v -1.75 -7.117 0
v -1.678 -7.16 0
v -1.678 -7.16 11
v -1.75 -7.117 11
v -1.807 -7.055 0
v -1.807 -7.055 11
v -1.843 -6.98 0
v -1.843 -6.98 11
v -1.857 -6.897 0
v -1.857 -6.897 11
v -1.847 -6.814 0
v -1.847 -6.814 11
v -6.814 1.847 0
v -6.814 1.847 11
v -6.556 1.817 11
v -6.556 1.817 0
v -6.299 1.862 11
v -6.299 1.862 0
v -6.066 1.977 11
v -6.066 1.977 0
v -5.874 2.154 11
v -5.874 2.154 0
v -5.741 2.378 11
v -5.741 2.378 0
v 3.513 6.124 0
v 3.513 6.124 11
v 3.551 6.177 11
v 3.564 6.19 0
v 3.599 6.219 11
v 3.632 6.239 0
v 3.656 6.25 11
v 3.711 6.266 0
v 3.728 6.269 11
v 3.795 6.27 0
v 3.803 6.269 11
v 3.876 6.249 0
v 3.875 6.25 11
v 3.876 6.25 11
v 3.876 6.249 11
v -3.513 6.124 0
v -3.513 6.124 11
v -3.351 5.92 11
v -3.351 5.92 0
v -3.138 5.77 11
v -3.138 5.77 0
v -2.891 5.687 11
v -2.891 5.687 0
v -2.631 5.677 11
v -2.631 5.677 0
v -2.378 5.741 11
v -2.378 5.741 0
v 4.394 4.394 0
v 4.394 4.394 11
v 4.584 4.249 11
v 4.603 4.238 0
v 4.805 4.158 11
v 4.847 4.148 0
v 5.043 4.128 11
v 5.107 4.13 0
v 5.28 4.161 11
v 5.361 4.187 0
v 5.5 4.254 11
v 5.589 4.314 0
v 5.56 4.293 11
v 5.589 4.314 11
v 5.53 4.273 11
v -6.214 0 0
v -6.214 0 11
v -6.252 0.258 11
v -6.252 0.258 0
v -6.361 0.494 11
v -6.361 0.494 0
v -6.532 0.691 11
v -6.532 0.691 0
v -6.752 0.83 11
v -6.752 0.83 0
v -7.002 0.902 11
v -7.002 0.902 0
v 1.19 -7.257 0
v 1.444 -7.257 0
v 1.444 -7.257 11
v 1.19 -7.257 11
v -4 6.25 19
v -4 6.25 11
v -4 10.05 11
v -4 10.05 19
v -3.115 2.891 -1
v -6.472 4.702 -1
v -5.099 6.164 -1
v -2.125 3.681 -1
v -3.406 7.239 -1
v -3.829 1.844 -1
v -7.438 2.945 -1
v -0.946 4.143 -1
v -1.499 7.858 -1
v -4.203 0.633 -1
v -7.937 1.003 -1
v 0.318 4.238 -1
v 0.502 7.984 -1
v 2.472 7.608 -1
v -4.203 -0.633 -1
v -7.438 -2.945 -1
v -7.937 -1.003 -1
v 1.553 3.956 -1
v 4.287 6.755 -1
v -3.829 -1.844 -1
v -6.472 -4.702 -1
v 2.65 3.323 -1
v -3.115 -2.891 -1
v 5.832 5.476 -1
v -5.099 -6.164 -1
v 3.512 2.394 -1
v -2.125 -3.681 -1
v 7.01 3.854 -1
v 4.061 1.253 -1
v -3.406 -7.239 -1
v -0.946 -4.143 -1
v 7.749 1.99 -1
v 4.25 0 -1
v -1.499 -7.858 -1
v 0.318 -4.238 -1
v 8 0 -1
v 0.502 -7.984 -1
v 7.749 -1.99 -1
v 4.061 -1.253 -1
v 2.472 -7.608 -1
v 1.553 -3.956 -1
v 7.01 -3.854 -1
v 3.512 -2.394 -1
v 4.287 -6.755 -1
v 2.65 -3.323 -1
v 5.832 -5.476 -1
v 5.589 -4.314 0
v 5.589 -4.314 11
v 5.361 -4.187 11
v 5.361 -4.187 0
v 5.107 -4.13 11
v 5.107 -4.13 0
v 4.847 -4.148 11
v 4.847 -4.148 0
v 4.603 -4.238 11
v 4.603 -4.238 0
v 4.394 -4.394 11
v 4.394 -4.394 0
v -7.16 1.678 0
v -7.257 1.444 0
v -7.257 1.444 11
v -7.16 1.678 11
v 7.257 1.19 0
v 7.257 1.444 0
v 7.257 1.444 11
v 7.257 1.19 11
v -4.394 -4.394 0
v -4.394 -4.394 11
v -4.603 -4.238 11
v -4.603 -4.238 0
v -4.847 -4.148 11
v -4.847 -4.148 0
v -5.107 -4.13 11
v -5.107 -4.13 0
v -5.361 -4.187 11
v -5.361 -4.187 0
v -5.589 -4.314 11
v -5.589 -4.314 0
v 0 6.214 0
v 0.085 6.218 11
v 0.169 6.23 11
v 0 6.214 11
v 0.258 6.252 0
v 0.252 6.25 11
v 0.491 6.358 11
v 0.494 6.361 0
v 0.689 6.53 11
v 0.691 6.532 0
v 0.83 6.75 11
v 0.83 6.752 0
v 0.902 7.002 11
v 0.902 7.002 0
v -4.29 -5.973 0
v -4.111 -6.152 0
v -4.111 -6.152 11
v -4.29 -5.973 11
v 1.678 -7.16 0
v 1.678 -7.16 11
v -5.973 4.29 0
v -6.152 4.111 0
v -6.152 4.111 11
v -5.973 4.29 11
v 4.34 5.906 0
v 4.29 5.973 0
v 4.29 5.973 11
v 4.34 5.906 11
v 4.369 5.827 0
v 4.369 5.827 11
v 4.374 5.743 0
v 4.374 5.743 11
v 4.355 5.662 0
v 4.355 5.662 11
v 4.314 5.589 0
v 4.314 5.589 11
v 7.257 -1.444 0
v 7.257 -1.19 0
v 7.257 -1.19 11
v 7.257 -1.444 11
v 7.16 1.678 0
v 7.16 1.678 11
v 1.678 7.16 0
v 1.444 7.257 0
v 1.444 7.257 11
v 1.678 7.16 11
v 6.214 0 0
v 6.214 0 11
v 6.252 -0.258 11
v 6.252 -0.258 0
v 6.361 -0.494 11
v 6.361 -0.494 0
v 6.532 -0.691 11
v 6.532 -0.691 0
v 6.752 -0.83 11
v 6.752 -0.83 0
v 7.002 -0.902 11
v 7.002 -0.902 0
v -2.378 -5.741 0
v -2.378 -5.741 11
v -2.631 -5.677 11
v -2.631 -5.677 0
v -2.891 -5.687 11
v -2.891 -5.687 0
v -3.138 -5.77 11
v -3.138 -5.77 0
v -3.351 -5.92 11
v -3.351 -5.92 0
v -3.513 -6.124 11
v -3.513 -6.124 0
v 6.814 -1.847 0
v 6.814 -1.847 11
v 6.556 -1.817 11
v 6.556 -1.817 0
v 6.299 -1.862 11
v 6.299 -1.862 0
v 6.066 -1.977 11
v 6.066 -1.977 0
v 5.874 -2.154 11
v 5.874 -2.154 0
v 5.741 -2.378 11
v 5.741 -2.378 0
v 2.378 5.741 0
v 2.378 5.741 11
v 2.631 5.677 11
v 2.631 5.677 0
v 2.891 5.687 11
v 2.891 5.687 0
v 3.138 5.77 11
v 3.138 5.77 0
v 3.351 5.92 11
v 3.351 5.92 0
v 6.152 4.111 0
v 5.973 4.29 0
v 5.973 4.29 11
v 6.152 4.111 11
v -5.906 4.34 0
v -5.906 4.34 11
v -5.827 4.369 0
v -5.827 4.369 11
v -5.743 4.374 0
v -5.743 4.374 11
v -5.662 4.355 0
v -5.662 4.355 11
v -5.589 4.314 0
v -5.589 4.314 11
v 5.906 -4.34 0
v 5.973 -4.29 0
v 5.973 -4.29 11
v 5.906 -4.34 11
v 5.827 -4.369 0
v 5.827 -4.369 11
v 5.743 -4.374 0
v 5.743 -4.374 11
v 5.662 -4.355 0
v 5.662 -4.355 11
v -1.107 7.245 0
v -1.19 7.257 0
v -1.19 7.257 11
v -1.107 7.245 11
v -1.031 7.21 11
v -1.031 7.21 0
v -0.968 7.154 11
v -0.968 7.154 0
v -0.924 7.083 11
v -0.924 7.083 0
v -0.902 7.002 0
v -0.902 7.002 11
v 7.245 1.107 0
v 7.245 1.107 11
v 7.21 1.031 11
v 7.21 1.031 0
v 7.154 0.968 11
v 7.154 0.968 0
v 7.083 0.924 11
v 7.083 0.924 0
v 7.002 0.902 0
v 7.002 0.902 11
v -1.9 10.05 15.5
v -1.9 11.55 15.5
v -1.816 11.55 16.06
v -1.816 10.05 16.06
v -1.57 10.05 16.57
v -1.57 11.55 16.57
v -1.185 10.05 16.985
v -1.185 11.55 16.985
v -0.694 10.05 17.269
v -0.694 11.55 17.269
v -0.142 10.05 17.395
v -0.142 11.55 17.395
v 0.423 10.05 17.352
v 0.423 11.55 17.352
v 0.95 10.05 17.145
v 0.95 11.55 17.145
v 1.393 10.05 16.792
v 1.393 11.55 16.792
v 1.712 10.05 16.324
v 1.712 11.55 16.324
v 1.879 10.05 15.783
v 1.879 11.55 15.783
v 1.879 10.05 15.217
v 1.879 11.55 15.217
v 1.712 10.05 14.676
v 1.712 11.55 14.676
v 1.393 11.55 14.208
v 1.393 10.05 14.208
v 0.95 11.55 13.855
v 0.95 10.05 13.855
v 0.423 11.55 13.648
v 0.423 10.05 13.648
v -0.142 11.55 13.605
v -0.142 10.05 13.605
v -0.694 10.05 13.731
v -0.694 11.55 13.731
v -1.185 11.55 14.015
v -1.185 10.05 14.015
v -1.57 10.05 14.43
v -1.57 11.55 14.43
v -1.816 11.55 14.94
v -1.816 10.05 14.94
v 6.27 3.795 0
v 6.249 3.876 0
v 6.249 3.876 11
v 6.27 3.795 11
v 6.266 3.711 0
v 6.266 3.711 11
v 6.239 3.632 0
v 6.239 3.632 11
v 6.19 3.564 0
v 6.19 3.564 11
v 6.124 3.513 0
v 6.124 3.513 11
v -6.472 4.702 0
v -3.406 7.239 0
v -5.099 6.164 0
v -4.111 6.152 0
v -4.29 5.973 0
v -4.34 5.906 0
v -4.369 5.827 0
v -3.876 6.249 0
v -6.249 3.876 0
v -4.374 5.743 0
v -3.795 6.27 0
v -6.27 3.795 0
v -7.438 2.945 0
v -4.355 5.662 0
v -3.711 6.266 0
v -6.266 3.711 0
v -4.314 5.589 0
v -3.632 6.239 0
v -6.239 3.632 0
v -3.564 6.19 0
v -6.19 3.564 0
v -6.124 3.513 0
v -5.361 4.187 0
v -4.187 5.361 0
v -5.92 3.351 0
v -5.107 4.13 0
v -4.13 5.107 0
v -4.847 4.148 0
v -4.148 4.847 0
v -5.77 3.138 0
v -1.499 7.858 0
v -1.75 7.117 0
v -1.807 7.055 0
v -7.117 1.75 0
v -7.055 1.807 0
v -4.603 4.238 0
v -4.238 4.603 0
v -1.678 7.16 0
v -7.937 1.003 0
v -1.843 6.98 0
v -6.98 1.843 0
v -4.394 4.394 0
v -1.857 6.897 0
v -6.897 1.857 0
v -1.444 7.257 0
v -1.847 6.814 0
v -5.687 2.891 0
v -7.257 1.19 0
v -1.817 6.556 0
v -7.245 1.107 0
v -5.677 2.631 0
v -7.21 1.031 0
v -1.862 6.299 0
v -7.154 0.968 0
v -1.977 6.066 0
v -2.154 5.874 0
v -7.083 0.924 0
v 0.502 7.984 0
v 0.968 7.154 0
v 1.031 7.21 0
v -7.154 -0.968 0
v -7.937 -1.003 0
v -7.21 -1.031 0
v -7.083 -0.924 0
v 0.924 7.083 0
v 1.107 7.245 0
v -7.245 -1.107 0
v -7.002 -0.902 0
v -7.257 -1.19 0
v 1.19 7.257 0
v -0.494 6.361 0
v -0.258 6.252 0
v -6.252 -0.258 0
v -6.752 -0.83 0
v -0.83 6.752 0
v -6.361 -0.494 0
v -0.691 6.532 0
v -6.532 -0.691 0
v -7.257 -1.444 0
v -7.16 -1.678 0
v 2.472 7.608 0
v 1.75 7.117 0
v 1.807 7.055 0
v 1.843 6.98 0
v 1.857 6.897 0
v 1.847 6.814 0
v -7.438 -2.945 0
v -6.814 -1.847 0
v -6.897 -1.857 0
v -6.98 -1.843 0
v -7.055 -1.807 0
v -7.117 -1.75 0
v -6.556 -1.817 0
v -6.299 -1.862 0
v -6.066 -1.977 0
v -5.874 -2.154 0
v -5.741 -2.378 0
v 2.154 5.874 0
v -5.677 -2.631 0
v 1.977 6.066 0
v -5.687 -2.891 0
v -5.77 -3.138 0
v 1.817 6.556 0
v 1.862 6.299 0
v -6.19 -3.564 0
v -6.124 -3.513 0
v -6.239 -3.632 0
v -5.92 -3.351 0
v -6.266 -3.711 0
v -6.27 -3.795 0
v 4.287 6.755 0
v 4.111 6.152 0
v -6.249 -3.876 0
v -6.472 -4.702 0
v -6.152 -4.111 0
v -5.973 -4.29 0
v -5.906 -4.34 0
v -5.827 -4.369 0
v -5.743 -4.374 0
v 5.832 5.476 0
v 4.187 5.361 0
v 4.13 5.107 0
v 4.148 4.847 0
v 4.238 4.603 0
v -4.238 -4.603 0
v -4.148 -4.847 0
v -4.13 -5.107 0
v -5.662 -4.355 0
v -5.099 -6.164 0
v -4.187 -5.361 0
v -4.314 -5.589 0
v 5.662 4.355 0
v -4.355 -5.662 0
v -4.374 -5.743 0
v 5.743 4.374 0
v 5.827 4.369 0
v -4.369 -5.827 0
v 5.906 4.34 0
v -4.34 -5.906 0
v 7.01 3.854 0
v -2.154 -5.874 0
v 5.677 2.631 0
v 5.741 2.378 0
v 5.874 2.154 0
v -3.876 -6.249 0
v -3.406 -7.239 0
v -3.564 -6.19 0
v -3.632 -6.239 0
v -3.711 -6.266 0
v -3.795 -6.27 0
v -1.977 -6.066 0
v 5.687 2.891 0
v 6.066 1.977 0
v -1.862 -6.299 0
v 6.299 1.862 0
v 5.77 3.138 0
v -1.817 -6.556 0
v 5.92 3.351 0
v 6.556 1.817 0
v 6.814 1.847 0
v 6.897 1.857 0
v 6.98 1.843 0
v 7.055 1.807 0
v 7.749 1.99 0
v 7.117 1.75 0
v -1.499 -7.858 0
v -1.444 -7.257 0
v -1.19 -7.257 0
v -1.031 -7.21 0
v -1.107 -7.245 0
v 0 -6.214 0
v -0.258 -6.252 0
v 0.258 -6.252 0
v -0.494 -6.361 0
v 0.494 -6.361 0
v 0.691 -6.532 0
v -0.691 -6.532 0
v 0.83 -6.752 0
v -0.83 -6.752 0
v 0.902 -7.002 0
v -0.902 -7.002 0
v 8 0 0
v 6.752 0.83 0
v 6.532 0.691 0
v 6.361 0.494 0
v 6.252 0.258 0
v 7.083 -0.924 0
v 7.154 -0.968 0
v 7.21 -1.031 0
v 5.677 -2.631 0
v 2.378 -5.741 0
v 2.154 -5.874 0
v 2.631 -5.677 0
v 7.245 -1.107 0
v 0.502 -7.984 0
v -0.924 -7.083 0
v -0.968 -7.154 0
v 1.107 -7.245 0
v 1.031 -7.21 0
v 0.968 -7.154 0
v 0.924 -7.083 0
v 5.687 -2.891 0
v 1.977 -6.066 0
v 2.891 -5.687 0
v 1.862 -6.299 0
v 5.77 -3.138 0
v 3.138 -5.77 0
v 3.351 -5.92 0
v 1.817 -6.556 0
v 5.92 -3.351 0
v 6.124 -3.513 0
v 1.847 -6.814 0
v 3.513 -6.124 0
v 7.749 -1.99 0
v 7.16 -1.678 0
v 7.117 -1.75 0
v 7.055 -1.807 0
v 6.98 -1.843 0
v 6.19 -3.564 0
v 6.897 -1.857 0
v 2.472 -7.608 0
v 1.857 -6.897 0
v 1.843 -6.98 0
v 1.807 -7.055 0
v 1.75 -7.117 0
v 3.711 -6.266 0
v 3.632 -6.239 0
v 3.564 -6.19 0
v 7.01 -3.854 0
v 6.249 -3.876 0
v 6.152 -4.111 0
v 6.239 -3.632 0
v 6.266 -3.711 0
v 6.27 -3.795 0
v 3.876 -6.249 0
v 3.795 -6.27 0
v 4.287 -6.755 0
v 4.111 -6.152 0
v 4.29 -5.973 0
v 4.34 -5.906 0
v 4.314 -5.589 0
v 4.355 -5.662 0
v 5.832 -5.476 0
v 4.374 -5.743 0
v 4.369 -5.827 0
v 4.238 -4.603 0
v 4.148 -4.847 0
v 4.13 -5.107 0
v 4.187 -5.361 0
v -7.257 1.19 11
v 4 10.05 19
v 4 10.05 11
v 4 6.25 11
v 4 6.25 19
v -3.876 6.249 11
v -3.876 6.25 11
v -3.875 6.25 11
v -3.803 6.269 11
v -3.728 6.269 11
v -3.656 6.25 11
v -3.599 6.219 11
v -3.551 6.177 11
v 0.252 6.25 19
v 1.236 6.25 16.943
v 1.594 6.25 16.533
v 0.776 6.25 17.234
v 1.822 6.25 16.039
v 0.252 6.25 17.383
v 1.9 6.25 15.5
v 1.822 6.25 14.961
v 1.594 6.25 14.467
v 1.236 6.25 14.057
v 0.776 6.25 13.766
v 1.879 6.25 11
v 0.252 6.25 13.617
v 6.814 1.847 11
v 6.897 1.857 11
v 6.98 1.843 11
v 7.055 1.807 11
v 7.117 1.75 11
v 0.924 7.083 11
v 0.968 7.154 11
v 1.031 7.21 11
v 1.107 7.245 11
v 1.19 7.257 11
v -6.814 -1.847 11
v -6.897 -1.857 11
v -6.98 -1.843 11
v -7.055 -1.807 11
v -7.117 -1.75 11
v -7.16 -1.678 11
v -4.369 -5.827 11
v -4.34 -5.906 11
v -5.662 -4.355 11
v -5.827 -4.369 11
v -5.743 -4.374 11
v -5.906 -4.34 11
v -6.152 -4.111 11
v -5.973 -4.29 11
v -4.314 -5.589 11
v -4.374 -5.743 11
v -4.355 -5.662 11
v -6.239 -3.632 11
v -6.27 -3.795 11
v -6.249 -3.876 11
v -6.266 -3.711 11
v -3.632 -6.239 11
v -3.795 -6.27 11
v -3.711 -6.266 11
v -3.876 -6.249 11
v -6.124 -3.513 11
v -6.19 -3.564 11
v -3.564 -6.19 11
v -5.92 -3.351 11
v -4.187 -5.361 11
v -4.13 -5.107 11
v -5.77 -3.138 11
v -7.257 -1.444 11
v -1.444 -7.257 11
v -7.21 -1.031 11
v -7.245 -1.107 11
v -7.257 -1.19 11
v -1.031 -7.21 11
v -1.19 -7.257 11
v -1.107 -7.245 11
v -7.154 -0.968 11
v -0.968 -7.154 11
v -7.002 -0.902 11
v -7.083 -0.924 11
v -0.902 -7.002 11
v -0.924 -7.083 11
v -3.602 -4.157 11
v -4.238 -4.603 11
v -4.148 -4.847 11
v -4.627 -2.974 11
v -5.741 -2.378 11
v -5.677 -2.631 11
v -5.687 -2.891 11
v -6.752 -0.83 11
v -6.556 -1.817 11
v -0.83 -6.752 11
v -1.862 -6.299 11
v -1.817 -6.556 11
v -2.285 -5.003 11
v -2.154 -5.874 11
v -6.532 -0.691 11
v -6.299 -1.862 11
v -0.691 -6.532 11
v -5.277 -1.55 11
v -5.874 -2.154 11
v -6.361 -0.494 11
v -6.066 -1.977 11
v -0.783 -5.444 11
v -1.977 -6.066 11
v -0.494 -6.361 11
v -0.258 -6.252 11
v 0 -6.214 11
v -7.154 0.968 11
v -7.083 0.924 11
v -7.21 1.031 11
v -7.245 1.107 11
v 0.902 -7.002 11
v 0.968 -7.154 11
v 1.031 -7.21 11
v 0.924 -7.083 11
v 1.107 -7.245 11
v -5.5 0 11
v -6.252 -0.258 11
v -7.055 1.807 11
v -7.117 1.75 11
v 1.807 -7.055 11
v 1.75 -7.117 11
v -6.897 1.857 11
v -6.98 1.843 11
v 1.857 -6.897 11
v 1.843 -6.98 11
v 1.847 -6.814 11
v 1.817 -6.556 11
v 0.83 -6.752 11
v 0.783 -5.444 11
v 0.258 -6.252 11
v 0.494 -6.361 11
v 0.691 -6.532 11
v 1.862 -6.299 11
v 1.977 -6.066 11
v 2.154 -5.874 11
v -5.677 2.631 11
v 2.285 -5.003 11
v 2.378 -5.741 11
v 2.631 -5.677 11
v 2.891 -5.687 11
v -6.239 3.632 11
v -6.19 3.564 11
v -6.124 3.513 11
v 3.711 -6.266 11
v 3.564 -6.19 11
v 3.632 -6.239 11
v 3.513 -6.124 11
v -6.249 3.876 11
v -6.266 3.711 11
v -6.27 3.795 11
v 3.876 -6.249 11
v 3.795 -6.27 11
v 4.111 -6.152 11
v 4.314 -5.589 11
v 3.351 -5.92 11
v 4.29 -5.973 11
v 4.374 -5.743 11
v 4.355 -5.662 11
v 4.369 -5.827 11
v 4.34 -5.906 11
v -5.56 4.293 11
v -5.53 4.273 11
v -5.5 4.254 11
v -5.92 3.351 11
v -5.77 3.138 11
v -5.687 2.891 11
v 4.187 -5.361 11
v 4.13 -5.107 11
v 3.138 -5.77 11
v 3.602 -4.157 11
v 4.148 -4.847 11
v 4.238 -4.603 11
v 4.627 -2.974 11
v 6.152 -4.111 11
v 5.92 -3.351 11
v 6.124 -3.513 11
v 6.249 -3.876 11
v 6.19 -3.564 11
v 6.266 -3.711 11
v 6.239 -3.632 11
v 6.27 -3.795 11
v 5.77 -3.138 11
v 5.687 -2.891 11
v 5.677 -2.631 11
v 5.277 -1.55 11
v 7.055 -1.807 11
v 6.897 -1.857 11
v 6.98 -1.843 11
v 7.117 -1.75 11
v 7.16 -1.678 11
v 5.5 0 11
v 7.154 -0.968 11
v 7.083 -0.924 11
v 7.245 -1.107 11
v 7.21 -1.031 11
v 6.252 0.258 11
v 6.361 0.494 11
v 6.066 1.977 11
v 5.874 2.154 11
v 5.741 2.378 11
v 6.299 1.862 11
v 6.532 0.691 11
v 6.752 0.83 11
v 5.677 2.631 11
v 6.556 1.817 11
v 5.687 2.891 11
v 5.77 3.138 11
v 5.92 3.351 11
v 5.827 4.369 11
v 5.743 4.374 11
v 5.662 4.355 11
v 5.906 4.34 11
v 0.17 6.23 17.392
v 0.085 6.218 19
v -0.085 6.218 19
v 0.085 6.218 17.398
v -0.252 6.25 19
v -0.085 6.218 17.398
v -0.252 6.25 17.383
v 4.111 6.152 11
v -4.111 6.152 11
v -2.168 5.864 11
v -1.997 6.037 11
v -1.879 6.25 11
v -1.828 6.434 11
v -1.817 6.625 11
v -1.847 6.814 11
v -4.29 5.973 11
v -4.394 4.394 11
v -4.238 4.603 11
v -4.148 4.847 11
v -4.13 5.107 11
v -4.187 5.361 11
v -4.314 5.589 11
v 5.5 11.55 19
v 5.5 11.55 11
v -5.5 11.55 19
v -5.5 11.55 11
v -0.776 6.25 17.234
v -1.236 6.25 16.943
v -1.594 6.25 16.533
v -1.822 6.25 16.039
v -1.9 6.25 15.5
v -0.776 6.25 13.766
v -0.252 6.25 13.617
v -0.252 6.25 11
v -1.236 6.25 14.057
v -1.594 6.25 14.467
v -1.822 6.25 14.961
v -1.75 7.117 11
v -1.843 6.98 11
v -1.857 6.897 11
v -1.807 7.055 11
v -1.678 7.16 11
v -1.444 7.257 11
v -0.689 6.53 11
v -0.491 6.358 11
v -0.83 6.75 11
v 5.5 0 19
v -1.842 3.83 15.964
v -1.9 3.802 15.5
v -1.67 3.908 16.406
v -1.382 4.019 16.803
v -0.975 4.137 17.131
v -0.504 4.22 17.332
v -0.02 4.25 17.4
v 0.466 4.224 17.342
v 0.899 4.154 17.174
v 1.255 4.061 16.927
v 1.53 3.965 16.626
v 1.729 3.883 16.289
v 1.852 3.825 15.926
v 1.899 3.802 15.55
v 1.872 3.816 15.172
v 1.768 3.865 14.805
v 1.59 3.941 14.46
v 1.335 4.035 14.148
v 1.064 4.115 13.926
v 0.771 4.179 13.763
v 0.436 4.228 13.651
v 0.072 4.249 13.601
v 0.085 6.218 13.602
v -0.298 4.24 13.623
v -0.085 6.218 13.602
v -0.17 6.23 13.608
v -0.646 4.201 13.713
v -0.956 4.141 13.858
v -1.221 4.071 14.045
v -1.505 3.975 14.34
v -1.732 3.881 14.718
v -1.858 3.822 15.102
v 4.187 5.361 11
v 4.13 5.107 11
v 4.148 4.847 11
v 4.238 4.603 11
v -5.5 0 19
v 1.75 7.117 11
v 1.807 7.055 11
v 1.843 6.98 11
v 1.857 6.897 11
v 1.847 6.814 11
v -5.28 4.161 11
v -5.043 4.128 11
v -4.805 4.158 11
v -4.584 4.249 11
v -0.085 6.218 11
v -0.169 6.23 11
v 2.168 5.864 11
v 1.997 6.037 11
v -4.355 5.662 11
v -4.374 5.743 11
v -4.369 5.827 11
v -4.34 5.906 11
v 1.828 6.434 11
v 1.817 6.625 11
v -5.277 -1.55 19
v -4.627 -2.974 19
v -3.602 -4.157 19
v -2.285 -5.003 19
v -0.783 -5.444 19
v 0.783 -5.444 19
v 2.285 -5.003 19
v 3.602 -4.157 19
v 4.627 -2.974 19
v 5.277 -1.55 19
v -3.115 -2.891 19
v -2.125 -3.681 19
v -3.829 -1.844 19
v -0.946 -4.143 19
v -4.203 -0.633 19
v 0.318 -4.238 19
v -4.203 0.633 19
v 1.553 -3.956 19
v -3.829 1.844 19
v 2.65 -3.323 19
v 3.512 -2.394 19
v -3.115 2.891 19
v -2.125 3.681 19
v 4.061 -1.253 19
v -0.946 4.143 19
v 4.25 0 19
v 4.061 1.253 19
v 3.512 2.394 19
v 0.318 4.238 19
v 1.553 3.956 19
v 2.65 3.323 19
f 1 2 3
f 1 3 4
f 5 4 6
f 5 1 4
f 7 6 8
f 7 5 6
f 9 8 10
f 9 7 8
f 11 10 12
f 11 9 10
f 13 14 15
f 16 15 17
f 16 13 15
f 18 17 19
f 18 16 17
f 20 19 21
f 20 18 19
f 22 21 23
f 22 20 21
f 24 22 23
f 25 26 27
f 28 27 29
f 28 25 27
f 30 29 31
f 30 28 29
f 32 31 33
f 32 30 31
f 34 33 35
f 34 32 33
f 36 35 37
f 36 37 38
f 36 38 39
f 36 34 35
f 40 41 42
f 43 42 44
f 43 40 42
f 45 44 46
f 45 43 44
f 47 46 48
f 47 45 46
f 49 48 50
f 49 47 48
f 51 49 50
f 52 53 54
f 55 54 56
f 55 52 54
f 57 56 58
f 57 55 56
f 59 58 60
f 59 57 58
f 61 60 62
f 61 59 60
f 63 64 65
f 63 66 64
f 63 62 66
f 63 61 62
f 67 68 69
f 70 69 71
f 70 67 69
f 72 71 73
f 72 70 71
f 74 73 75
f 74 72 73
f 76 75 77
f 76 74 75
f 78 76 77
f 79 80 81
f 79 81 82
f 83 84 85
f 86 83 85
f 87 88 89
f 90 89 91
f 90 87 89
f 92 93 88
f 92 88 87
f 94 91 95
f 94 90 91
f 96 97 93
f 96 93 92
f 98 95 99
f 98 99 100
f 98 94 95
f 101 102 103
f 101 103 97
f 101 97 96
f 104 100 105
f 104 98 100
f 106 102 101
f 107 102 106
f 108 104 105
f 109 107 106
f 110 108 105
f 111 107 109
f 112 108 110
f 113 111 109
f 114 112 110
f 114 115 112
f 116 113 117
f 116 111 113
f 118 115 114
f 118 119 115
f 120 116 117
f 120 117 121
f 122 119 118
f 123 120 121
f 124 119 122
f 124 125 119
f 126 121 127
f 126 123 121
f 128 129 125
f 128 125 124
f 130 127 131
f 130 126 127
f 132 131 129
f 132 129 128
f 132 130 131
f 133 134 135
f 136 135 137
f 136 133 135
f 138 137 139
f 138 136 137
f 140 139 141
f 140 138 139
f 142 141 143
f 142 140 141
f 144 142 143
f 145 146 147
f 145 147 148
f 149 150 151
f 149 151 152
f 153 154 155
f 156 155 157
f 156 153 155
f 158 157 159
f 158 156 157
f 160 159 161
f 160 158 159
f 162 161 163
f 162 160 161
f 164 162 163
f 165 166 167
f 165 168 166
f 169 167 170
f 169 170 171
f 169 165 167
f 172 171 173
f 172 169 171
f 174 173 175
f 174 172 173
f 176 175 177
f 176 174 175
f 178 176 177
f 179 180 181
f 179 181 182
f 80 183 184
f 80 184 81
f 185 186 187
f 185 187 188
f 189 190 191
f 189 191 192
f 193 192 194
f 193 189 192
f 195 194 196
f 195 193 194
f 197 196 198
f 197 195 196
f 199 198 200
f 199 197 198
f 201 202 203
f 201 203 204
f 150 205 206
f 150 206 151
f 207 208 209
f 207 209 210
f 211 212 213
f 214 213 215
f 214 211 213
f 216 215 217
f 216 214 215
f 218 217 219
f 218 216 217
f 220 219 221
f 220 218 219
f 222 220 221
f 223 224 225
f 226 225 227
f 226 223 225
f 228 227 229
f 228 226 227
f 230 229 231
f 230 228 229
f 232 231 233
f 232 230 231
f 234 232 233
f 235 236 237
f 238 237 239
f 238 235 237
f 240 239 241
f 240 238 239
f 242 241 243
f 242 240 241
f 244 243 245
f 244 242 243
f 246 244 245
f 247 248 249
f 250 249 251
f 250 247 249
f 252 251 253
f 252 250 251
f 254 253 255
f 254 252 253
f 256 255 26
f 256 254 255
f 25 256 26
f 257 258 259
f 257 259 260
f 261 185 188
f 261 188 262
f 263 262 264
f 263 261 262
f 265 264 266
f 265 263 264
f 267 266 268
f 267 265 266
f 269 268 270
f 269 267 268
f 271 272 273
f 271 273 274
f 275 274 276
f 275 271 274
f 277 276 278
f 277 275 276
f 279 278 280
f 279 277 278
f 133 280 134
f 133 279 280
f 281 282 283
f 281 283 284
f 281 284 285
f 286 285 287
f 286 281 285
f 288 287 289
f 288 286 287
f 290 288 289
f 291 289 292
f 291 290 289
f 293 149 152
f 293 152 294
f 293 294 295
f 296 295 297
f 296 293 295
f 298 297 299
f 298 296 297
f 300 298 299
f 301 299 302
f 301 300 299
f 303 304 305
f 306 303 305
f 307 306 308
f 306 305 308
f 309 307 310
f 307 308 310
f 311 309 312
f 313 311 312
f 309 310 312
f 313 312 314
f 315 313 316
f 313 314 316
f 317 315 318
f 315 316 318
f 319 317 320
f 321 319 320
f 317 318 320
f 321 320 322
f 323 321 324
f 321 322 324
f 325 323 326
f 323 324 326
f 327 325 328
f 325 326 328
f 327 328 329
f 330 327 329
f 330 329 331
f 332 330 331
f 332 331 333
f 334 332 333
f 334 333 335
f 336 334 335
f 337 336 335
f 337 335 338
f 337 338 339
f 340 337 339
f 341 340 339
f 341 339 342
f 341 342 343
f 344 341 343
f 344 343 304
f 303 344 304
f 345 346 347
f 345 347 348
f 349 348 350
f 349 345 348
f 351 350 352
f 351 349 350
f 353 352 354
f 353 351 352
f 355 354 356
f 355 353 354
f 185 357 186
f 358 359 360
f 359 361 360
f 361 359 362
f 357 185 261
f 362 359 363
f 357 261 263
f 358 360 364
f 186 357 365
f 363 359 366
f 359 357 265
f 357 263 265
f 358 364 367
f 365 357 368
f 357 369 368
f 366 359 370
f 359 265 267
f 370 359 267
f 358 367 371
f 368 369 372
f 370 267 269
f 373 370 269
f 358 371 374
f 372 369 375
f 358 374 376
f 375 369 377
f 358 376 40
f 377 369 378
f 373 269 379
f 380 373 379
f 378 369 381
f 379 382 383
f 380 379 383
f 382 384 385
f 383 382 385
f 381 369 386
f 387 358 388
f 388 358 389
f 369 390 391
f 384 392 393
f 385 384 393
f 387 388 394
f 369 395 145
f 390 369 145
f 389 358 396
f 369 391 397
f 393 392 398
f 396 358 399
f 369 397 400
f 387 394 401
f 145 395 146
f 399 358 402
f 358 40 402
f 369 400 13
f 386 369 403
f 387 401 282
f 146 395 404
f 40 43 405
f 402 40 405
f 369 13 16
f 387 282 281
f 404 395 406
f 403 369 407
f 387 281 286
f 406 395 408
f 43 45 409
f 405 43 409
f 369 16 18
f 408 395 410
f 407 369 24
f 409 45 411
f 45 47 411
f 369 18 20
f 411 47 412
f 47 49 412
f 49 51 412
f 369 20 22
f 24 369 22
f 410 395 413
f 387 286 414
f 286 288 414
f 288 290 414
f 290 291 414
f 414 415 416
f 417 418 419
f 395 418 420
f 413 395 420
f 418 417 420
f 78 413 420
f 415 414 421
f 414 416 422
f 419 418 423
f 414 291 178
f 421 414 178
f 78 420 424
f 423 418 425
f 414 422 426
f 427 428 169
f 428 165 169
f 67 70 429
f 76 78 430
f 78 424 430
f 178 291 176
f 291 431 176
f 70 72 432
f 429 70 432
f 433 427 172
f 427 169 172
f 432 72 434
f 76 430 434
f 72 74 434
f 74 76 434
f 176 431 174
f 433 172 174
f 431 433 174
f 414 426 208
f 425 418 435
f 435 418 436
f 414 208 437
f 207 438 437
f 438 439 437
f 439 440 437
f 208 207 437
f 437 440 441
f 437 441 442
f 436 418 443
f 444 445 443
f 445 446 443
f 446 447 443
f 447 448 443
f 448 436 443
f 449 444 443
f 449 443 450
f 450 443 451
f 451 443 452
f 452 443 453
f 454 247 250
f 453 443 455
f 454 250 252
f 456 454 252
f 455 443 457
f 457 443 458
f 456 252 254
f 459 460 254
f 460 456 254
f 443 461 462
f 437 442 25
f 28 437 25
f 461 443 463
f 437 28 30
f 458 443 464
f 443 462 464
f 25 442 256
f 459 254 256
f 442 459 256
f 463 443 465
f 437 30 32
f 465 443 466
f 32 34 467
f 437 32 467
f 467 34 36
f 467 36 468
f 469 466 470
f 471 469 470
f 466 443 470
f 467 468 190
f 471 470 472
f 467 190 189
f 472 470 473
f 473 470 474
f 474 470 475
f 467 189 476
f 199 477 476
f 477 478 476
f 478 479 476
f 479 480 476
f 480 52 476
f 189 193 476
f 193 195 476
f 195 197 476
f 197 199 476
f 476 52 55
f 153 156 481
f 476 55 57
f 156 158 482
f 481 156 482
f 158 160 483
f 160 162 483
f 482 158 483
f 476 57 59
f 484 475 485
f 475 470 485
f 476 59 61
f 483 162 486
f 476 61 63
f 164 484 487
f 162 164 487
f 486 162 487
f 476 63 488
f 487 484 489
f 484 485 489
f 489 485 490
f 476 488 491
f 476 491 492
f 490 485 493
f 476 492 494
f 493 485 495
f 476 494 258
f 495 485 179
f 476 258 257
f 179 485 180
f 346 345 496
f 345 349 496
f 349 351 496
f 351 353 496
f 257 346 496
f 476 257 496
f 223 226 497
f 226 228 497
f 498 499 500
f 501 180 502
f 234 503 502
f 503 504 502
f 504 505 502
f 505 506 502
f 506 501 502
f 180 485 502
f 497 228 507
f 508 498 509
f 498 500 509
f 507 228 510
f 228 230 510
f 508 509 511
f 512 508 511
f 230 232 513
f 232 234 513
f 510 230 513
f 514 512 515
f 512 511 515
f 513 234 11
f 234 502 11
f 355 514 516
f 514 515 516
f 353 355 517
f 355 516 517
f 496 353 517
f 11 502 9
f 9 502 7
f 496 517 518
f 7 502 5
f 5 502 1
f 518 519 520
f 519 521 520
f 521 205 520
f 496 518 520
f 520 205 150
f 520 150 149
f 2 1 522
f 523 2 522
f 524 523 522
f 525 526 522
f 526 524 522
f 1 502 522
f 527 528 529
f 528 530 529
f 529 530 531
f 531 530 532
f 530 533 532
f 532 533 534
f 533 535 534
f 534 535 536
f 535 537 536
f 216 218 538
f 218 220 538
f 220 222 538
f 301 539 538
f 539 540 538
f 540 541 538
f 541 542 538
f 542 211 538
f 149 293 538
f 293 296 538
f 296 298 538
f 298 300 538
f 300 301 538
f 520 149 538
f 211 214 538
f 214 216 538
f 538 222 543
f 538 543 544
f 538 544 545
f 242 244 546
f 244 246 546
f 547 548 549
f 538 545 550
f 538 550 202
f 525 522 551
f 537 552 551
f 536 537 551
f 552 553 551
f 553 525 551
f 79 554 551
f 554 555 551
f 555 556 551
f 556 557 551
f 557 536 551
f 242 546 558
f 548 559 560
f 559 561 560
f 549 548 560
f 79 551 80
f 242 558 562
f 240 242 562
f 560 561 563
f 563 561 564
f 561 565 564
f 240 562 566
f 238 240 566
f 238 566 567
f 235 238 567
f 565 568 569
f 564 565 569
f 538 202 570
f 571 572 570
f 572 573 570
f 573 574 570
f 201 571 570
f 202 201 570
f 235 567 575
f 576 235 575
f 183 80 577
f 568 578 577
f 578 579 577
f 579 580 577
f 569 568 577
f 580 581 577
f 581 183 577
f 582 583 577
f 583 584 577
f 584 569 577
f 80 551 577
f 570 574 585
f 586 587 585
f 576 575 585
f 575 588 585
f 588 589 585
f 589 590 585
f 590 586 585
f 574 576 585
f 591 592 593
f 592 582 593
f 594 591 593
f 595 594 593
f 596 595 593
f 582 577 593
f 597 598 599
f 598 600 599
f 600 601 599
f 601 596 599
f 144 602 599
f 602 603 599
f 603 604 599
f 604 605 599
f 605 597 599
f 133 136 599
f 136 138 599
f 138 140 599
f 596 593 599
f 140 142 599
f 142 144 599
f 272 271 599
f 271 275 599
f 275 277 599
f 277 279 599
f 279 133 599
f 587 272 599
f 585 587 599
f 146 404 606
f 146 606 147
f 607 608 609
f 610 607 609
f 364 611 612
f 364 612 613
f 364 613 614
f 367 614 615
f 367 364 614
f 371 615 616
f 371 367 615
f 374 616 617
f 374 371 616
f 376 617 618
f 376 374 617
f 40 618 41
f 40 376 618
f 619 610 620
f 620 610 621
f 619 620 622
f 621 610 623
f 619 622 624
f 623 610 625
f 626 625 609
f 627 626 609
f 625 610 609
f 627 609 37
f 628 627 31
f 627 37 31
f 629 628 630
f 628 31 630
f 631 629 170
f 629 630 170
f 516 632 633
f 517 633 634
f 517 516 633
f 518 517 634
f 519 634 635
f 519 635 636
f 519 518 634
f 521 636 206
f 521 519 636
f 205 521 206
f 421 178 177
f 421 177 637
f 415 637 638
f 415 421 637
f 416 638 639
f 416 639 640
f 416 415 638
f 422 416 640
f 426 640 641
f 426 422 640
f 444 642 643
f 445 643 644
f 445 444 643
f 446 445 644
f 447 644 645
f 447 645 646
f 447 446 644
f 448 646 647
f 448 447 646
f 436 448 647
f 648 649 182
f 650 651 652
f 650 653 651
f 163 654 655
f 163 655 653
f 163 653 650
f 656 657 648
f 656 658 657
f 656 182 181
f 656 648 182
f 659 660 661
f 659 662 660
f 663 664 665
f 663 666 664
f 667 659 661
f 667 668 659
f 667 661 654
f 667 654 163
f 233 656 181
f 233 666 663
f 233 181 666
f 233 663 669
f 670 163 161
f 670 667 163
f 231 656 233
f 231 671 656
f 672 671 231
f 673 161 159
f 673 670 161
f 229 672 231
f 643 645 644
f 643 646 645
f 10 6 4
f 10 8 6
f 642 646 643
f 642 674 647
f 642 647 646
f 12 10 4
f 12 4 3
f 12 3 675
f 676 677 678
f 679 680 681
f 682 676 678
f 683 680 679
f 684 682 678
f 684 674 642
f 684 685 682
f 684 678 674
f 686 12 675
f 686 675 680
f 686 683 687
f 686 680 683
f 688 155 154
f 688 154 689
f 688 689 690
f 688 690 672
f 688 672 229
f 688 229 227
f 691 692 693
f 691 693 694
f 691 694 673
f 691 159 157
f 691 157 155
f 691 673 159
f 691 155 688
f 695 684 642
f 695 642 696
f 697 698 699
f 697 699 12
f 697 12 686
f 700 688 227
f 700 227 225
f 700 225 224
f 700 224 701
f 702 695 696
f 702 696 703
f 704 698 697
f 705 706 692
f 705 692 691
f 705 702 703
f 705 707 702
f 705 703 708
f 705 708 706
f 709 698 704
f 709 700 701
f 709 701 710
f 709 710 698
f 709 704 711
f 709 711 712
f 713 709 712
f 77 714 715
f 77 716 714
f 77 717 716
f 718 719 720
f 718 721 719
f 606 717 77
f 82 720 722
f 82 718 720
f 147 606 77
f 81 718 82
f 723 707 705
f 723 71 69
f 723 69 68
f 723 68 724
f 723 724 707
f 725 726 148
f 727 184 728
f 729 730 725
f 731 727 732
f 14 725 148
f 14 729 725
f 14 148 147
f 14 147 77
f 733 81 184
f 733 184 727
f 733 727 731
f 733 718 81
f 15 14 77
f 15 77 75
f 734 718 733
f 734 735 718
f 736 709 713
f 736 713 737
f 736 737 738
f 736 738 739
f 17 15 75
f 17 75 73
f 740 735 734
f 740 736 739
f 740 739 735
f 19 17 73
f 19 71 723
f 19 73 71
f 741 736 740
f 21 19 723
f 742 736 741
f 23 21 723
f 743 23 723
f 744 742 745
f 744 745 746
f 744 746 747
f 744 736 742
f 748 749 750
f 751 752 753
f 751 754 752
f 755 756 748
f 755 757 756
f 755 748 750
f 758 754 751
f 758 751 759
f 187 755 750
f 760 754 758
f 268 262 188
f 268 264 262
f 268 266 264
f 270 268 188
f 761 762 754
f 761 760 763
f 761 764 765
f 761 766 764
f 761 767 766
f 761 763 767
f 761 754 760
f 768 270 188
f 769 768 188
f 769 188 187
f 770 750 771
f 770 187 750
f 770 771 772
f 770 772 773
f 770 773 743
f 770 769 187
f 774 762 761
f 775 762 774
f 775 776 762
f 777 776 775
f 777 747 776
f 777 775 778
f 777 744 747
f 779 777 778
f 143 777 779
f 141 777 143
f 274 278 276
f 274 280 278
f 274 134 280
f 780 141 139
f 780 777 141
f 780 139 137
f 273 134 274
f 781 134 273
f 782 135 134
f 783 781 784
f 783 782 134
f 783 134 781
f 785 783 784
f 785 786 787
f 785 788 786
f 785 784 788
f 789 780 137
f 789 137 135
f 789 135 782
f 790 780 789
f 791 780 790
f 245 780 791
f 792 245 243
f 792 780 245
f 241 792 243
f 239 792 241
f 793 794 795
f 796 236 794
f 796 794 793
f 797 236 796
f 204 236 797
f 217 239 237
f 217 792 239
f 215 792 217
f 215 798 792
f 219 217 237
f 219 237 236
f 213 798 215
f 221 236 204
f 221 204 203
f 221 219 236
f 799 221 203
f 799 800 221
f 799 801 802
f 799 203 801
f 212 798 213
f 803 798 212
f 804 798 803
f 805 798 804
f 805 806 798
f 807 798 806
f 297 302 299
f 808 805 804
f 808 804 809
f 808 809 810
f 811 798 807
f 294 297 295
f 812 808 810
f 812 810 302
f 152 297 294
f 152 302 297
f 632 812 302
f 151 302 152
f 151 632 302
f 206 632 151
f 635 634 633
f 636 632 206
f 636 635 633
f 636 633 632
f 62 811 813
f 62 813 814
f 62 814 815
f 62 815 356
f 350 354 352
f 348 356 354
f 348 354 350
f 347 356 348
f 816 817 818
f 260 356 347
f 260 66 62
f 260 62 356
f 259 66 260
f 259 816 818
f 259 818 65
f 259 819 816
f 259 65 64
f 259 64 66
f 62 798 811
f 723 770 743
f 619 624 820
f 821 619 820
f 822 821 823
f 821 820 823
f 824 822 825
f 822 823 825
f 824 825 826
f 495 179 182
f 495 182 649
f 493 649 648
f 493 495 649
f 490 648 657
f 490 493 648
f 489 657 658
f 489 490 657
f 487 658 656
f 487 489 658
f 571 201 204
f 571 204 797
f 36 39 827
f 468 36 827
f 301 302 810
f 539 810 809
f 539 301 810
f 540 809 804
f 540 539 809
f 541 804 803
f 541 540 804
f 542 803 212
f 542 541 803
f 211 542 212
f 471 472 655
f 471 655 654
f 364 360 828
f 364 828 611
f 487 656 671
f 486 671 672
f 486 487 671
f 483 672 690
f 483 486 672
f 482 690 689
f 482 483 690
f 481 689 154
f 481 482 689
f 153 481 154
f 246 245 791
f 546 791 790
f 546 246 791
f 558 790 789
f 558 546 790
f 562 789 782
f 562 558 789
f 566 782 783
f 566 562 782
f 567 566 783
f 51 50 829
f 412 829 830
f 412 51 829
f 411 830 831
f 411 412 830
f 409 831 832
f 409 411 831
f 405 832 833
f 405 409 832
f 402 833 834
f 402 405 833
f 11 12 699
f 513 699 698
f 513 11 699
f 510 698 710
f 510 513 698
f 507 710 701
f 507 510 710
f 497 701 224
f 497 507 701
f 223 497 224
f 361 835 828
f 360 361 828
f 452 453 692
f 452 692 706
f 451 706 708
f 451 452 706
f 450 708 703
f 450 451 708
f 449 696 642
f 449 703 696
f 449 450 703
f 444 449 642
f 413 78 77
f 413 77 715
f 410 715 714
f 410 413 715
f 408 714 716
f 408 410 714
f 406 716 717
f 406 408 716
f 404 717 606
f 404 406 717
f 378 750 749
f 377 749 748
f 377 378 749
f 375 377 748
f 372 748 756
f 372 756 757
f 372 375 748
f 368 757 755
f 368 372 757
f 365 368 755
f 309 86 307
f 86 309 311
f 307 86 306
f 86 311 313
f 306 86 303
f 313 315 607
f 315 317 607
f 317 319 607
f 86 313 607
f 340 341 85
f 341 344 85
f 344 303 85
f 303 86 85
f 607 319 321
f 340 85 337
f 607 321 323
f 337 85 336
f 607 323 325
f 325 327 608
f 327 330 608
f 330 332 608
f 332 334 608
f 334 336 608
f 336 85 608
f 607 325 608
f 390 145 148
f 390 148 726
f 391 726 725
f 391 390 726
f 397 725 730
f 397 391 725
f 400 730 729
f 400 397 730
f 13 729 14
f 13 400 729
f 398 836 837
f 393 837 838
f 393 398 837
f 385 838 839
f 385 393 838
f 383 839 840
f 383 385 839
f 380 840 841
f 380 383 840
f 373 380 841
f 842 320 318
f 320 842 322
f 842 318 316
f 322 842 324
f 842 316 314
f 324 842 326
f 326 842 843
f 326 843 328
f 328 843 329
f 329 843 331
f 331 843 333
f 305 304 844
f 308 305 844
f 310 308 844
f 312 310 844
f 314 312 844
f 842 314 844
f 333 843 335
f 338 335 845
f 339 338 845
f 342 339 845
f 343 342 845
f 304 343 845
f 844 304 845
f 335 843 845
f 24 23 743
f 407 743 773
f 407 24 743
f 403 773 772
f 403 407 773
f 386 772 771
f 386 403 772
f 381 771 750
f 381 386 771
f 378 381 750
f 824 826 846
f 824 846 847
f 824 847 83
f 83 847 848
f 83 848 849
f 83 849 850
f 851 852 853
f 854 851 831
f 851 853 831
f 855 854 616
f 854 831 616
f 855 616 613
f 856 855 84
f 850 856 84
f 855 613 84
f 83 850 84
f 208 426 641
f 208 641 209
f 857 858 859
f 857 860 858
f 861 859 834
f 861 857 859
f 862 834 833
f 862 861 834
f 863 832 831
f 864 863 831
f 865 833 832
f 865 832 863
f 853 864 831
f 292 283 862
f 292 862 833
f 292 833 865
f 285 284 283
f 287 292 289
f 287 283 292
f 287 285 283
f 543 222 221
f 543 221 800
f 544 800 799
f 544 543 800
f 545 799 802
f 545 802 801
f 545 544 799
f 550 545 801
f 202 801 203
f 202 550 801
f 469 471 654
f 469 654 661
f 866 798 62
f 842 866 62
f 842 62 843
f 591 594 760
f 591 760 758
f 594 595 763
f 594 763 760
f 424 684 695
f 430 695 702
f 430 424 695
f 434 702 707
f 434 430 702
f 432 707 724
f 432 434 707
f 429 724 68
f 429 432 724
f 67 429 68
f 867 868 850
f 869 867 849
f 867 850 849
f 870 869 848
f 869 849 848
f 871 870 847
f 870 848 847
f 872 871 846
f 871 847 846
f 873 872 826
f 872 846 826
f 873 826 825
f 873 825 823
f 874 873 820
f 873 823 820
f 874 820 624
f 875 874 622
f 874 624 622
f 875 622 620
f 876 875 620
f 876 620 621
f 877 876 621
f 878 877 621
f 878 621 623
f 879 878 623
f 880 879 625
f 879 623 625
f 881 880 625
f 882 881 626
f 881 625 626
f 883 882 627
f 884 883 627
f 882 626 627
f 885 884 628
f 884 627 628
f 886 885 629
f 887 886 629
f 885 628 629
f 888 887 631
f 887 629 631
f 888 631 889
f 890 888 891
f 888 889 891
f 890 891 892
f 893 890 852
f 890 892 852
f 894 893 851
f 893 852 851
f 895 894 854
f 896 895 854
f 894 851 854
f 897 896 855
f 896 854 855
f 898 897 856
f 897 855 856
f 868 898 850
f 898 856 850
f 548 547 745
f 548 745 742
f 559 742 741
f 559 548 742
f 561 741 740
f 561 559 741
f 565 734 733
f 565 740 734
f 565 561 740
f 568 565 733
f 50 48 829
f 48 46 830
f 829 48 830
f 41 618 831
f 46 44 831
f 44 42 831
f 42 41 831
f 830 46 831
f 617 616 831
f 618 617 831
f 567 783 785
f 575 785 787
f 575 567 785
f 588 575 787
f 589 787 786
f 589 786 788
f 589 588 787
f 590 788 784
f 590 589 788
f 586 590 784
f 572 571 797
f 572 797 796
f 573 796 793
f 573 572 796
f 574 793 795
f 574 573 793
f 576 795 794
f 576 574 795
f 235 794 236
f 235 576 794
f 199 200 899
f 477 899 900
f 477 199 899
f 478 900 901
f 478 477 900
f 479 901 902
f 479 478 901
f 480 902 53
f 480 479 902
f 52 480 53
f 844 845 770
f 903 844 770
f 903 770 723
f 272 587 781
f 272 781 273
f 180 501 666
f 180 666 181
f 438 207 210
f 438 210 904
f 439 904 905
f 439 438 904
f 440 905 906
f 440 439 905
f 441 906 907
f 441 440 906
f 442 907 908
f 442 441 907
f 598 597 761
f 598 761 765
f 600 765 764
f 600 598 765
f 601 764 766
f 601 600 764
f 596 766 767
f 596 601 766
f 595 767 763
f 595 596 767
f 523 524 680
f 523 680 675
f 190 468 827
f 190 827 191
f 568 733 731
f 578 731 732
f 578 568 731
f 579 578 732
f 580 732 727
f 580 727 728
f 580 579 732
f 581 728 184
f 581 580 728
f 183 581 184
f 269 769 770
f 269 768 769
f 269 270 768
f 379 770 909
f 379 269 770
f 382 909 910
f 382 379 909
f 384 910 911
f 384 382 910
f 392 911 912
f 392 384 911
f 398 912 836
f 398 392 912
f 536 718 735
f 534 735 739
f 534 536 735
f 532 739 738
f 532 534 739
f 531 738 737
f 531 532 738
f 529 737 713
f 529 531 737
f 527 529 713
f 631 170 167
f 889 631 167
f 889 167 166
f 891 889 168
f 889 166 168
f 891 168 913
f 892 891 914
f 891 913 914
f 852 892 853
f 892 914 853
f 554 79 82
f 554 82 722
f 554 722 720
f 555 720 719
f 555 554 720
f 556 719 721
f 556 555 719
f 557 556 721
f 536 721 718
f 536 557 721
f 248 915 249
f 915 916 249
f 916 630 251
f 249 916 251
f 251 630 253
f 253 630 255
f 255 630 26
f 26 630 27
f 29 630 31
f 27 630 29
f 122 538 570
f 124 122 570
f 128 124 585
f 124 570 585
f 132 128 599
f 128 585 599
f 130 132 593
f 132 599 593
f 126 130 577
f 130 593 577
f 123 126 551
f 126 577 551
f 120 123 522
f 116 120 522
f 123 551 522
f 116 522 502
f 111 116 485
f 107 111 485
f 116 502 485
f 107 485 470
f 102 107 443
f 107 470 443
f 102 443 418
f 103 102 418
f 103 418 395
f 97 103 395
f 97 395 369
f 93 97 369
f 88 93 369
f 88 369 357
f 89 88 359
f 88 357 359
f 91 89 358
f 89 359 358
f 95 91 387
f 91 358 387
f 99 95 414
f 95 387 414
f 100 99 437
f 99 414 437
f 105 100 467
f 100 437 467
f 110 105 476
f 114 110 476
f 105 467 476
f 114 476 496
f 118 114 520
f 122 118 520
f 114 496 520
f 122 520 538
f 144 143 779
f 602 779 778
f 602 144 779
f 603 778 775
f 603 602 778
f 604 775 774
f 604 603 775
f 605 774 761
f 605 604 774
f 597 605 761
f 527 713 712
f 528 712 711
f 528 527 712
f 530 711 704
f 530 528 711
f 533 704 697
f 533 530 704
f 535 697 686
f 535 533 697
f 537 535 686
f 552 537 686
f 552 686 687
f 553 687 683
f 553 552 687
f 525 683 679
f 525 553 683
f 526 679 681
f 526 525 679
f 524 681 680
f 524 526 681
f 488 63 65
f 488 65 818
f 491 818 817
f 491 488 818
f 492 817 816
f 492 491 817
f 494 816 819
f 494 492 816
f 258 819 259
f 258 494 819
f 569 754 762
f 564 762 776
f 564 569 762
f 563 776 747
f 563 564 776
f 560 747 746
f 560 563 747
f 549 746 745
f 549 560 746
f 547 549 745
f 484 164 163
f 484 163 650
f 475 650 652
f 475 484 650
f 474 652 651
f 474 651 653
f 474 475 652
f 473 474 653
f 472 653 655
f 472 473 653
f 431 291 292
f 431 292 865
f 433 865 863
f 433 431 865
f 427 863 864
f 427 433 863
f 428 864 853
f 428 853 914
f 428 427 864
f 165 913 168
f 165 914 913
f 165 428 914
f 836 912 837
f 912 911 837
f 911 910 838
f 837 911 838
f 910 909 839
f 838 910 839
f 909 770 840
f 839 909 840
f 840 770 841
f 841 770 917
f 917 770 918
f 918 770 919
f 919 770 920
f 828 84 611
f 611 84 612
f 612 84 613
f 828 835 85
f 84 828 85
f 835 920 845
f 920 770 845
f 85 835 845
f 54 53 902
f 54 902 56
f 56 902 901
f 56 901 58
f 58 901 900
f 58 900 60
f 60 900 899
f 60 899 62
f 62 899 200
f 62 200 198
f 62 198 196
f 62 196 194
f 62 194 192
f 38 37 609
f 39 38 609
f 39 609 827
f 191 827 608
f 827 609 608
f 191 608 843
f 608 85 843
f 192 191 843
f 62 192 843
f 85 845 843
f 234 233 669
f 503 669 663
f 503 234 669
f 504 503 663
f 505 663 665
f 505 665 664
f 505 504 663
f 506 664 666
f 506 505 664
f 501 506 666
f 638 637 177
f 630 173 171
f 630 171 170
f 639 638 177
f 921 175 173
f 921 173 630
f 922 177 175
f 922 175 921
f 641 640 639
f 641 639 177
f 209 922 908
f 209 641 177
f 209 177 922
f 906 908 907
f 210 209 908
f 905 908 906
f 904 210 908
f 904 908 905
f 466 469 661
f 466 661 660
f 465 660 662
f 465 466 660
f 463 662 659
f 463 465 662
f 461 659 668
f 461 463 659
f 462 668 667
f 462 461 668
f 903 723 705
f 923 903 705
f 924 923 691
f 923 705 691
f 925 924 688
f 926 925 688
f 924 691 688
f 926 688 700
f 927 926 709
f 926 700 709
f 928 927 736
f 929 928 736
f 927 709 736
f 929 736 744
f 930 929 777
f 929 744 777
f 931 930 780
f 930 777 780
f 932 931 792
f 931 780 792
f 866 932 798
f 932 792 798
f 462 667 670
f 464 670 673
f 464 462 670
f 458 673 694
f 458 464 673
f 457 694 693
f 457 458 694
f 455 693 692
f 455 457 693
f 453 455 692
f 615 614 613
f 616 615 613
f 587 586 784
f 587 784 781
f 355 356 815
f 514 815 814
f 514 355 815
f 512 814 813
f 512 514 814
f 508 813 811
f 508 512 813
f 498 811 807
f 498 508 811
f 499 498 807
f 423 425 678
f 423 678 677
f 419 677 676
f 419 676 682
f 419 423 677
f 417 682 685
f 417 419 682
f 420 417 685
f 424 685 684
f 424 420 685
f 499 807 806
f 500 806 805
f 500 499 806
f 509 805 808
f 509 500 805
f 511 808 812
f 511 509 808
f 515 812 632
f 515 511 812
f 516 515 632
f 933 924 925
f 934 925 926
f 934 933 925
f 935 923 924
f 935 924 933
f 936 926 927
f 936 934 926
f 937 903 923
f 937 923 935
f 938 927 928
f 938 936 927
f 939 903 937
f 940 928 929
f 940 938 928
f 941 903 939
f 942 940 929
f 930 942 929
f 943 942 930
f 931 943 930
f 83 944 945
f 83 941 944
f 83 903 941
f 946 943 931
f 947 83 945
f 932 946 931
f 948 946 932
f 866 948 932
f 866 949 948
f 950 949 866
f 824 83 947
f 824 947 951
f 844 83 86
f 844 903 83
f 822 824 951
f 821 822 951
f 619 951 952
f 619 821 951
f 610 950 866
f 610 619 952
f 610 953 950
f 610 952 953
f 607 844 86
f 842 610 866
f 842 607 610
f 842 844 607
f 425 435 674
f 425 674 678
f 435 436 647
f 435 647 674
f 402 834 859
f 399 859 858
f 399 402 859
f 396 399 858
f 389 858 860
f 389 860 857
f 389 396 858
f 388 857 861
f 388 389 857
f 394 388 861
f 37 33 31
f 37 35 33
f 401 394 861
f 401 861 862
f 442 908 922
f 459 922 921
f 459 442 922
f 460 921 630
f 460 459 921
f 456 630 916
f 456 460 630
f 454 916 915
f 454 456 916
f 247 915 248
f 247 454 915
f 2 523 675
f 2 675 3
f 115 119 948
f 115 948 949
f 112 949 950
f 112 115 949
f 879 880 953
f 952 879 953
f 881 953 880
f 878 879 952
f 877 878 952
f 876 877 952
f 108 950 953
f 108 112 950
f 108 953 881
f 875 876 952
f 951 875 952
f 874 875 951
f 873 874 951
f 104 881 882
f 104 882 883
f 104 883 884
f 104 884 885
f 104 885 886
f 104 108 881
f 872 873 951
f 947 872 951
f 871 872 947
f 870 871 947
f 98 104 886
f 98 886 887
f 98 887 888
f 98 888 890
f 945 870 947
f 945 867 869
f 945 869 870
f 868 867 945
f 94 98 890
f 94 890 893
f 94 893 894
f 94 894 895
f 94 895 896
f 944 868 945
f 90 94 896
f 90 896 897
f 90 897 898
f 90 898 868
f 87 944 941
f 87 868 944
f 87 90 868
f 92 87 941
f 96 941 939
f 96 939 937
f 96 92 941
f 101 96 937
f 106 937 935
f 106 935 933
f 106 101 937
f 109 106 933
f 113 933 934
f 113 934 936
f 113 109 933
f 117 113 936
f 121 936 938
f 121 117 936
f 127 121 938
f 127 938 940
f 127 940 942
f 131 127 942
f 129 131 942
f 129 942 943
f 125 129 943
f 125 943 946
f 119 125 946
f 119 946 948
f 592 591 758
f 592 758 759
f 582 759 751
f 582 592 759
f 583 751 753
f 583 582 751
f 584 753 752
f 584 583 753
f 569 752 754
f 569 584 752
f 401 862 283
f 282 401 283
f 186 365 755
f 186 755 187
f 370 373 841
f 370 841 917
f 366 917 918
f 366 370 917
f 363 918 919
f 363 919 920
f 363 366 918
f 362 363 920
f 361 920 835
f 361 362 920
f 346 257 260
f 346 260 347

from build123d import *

# Parameters (mm, degrees)
F0_R             = 7.6394373987
F0_R_2           = 4.25
F1_DEPTH         = 11
F3_DEPTH         = 11.001
F3_COPIES_COUNT  = 8
F3_COPIES_ANGLE  = 157.5
F3_COPIES1_COUNT = 9
F3_COPIES1_ANGLE = 180
F4_R             = 8
F4_R_2           = 4.25
F5_DEPTH         = 1
F6_R             = 4.25
F7_DEPTH         = 8
F8_R             = 1.9
F9_DEPTH         = 10


# Not quite as in the source:
# - ends of sketch curves that miss each other by under 0.0002 mm in the source are joined
# - a pattern or mirror of a feature is missing from the dataset's text; its kind, count and spacing are read off the source's solid
# - a feature names something its author has since deleted; it is built from what else it names


with BuildPart() as f1:
    # F0 (on Top) → F1 (new body)
    with BuildSketch(Plane.XY):
        Circle(F0_R)
        Circle(F0_R_2, mode=Mode.SUBTRACT)
    extrude(amount=F1_DEPTH)

    # F2 (on Top) → F3 (cut, through all)
    with BuildSketch(Plane.XY):
        with BuildLine():
            ThreePointArc((0.9017719181, -7.0023415032), (0.5987456618, -6.4391610804), (0, -6.2144373987))
            ThreePointArc((0, -6.2144373987), (-0.5987456618, -6.4391610804), (-0.9017719181, -7.0023415032))
            ThreePointArc((-0.9017719181, -7.0023415032), (-0.9975198669, -7.184187159), (-1.1896796808, -7.25699))
            Line((-1.1896796808, -7.25699), (-2.3868598428, -7.25699))
            ThreePointArc((-2.3868598428, -7.25699), (0, -7.6394373987), (2.3868598428, -7.25699))
            Line((2.3868598428, -7.25699), (1.1896796808, -7.25699))
            ThreePointArc((1.1896796808, -7.25699), (0.9975198669, -7.184187159), (0.9017719181, -7.0023415032))
        make_face()
    f3 = extrude(amount=F3_DEPTH, mode=Mode.SUBTRACT)

    # F3_copies: F3 ×8 about axis
    f3_copies_axis = Axis((0, 0, 0), (0, 0, -1))
    for i in range(1, F3_COPIES_COUNT):
        add(f3.rotate(f3_copies_axis, i * F3_COPIES_ANGLE / (F3_COPIES_COUNT - 1)), mode=Mode.SUBTRACT)

    # F3_copies1: F3 ×9 about axis
    f3_copies1_axis = Axis((0, 0, 0), (0, 0, 1))
    for i in range(1, F3_COPIES1_COUNT):
        add(f3.rotate(f3_copies1_axis, i * F3_COPIES1_ANGLE / (F3_COPIES1_COUNT - 1)), mode=Mode.SUBTRACT)

    # F4 (on face) → F5 (join)
    with BuildSketch(Plane(origin=(0, 0, 0), x_dir=(1, 0, 0), z_dir=(0, 0, -1))):
        Circle(F4_R)
        Circle(F4_R_2, mode=Mode.SUBTRACT)
    extrude(amount=F5_DEPTH)

    # F6 (on face) → F7 (join)
    with BuildSketch(Plane.XY.offset(11)):
        with BuildLine():
            Line((-5.5, 4.2538924505), (-5.5, 0))
            ThreePointArc((-5.5, 0), (0, -5.5), (5.5, 0))
            Line((5.5, 0), (5.5, 4.2538924505))
            ThreePointArc((5.5, 4.2538924505), (4.3574531497, 4.4333271044), (4.3137541227, 5.5890521994))
            ThreePointArc((4.3137541227, 5.5890521994), (4.3746351807, 5.7853277116), (4.2902362702, 5.9726974098))
            Line((4.2902362702, 5.9726974098), (4.1107546227, 6.1521790573))
            Line((4.1107546227, 6.1521790573), (3.8762505492, 6.249313825))
            ThreePointArc((3.8762505492, 6.249313825), (3.8754150111, 6.2496582146), (3.8745784043, 6.25))
            Line((3.8745784043, 6.25), (3.6559571933, 6.25))
            ThreePointArc((3.6559571933, 6.25), (3.5737630913, 6.1992003777), (3.5128086992, 6.1242268216))
            ThreePointArc((3.5128086992, 6.1242268216), (2.65655008, 5.6748069492), (1.8791762967, 6.25))
            Line((1.8791762967, 6.25), (0.2519111663, 6.25))
            ThreePointArc((0.2519111663, 6.25), (0, 6.2144373987), (-0.2519111663, 6.25))
            Line((-0.2519111663, 6.25), (-1.8791762967, 6.25))
            ThreePointArc((-1.8791762967, 6.25), (-2.65655008, 5.6748069492), (-3.5128086992, 6.1242268216))
            ThreePointArc((-3.5128086992, 6.1242268216), (-3.5737630913, 6.1992003777), (-3.6559571933, 6.25))
            Line((-3.6559571933, 6.25), (-3.8745784043, 6.25))
            ThreePointArc((-3.8745784043, 6.25), (-3.8754150111, 6.2496582146), (-3.8762505492, 6.249313825))
            Line((-3.8762505492, 6.249313825), (-4.1107546227, 6.1521790573))
            Line((-4.1107546227, 6.1521790573), (-4.2902362702, 5.9726974098))
            ThreePointArc((-4.2902362702, 5.9726974098), (-4.3746351807, 5.7853277116), (-4.3137541227, 5.5890521994))
            ThreePointArc((-4.3137541227, 5.5890521994), (-4.3574531497, 4.4333271044), (-5.5, 4.2538924505))
        make_face()
        Circle(F6_R, mode=Mode.SUBTRACT)
        with BuildLine():
            Line((-5.5, 11.55), (-5.5, 4.2538924505))
            ThreePointArc((-5.5, 4.2538924505), (-4.3574531497, 4.4333271044), (-4.3137541227, 5.5890521994))
            ThreePointArc((-4.3137541227, 5.5890521994), (-4.3746351807, 5.7853277116), (-4.2902362702, 5.9726974098))
            Line((-4.2902362702, 5.9726974098), (-4.1107546227, 6.1521790573))
            Line((-4.1107546227, 6.1521790573), (-3.8762505492, 6.249313825))
            ThreePointArc((-3.8762505492, 6.249313825), (-3.8754150111, 6.2496582146), (-3.8745784043, 6.25))
            Line((-3.8745784043, 6.25), (-4, 6.25))
            Line((-4, 6.25), (-4, 10.05))
            Line((-4, 10.05), (4, 10.05))
            Line((4, 10.05), (4, 6.25))
            Line((4, 6.25), (3.8745784043, 6.25))
            ThreePointArc((3.8745784043, 6.25), (3.8754150111, 6.2496582146), (3.8762505492, 6.249313825))
            Line((3.8762505492, 6.249313825), (4.1107546227, 6.1521790573))
            Line((4.1107546227, 6.1521790573), (4.2902362702, 5.9726974098))
            ThreePointArc((4.2902362702, 5.9726974098), (4.3746351807, 5.7853277116), (4.3137541227, 5.5890521994))
            ThreePointArc((4.3137541227, 5.5890521994), (4.3574531497, 4.4333271044), (5.5, 4.2538924505))
            Line((5.5, 4.2538924505), (5.5, 11.55))
            Line((5.5, 11.55), (-5.5, 11.55))
        make_face()
        with BuildLine():
            Line((-1.8791762967, 6.25), (-3.6559571933, 6.25))
            ThreePointArc((-3.6559571933, 6.25), (-3.5737630913, 6.1992003777), (-3.5128086992, 6.1242268216))
            ThreePointArc((-3.5128086992, 6.1242268216), (-2.65655008, 5.6748069492), (-1.8791762967, 6.25))
        make_face()
        with BuildLine():
            ThreePointArc((3.5128086992, 6.1242268216), (3.5737630913, 6.1992003777), (3.6559571933, 6.25))
            Line((3.6559571933, 6.25), (1.8791762967, 6.25))
            ThreePointArc((1.8791762967, 6.25), (2.65655008, 5.6748069492), (3.5128086992, 6.1242268216))
        make_face()
    extrude(amount=F7_DEPTH)

    # F8 (on face) → F9 (cut)
    with BuildSketch(Plane(origin=(0, 11.55, 0), x_dir=(-1, 0, 0), z_dir=(0, 1, 0))):
        with Locations((0, 15.5)):
            Circle(F8_R)
    extrude(amount=-F9_DEPTH, mode=Mode.SUBTRACT)


solid = f1.part
